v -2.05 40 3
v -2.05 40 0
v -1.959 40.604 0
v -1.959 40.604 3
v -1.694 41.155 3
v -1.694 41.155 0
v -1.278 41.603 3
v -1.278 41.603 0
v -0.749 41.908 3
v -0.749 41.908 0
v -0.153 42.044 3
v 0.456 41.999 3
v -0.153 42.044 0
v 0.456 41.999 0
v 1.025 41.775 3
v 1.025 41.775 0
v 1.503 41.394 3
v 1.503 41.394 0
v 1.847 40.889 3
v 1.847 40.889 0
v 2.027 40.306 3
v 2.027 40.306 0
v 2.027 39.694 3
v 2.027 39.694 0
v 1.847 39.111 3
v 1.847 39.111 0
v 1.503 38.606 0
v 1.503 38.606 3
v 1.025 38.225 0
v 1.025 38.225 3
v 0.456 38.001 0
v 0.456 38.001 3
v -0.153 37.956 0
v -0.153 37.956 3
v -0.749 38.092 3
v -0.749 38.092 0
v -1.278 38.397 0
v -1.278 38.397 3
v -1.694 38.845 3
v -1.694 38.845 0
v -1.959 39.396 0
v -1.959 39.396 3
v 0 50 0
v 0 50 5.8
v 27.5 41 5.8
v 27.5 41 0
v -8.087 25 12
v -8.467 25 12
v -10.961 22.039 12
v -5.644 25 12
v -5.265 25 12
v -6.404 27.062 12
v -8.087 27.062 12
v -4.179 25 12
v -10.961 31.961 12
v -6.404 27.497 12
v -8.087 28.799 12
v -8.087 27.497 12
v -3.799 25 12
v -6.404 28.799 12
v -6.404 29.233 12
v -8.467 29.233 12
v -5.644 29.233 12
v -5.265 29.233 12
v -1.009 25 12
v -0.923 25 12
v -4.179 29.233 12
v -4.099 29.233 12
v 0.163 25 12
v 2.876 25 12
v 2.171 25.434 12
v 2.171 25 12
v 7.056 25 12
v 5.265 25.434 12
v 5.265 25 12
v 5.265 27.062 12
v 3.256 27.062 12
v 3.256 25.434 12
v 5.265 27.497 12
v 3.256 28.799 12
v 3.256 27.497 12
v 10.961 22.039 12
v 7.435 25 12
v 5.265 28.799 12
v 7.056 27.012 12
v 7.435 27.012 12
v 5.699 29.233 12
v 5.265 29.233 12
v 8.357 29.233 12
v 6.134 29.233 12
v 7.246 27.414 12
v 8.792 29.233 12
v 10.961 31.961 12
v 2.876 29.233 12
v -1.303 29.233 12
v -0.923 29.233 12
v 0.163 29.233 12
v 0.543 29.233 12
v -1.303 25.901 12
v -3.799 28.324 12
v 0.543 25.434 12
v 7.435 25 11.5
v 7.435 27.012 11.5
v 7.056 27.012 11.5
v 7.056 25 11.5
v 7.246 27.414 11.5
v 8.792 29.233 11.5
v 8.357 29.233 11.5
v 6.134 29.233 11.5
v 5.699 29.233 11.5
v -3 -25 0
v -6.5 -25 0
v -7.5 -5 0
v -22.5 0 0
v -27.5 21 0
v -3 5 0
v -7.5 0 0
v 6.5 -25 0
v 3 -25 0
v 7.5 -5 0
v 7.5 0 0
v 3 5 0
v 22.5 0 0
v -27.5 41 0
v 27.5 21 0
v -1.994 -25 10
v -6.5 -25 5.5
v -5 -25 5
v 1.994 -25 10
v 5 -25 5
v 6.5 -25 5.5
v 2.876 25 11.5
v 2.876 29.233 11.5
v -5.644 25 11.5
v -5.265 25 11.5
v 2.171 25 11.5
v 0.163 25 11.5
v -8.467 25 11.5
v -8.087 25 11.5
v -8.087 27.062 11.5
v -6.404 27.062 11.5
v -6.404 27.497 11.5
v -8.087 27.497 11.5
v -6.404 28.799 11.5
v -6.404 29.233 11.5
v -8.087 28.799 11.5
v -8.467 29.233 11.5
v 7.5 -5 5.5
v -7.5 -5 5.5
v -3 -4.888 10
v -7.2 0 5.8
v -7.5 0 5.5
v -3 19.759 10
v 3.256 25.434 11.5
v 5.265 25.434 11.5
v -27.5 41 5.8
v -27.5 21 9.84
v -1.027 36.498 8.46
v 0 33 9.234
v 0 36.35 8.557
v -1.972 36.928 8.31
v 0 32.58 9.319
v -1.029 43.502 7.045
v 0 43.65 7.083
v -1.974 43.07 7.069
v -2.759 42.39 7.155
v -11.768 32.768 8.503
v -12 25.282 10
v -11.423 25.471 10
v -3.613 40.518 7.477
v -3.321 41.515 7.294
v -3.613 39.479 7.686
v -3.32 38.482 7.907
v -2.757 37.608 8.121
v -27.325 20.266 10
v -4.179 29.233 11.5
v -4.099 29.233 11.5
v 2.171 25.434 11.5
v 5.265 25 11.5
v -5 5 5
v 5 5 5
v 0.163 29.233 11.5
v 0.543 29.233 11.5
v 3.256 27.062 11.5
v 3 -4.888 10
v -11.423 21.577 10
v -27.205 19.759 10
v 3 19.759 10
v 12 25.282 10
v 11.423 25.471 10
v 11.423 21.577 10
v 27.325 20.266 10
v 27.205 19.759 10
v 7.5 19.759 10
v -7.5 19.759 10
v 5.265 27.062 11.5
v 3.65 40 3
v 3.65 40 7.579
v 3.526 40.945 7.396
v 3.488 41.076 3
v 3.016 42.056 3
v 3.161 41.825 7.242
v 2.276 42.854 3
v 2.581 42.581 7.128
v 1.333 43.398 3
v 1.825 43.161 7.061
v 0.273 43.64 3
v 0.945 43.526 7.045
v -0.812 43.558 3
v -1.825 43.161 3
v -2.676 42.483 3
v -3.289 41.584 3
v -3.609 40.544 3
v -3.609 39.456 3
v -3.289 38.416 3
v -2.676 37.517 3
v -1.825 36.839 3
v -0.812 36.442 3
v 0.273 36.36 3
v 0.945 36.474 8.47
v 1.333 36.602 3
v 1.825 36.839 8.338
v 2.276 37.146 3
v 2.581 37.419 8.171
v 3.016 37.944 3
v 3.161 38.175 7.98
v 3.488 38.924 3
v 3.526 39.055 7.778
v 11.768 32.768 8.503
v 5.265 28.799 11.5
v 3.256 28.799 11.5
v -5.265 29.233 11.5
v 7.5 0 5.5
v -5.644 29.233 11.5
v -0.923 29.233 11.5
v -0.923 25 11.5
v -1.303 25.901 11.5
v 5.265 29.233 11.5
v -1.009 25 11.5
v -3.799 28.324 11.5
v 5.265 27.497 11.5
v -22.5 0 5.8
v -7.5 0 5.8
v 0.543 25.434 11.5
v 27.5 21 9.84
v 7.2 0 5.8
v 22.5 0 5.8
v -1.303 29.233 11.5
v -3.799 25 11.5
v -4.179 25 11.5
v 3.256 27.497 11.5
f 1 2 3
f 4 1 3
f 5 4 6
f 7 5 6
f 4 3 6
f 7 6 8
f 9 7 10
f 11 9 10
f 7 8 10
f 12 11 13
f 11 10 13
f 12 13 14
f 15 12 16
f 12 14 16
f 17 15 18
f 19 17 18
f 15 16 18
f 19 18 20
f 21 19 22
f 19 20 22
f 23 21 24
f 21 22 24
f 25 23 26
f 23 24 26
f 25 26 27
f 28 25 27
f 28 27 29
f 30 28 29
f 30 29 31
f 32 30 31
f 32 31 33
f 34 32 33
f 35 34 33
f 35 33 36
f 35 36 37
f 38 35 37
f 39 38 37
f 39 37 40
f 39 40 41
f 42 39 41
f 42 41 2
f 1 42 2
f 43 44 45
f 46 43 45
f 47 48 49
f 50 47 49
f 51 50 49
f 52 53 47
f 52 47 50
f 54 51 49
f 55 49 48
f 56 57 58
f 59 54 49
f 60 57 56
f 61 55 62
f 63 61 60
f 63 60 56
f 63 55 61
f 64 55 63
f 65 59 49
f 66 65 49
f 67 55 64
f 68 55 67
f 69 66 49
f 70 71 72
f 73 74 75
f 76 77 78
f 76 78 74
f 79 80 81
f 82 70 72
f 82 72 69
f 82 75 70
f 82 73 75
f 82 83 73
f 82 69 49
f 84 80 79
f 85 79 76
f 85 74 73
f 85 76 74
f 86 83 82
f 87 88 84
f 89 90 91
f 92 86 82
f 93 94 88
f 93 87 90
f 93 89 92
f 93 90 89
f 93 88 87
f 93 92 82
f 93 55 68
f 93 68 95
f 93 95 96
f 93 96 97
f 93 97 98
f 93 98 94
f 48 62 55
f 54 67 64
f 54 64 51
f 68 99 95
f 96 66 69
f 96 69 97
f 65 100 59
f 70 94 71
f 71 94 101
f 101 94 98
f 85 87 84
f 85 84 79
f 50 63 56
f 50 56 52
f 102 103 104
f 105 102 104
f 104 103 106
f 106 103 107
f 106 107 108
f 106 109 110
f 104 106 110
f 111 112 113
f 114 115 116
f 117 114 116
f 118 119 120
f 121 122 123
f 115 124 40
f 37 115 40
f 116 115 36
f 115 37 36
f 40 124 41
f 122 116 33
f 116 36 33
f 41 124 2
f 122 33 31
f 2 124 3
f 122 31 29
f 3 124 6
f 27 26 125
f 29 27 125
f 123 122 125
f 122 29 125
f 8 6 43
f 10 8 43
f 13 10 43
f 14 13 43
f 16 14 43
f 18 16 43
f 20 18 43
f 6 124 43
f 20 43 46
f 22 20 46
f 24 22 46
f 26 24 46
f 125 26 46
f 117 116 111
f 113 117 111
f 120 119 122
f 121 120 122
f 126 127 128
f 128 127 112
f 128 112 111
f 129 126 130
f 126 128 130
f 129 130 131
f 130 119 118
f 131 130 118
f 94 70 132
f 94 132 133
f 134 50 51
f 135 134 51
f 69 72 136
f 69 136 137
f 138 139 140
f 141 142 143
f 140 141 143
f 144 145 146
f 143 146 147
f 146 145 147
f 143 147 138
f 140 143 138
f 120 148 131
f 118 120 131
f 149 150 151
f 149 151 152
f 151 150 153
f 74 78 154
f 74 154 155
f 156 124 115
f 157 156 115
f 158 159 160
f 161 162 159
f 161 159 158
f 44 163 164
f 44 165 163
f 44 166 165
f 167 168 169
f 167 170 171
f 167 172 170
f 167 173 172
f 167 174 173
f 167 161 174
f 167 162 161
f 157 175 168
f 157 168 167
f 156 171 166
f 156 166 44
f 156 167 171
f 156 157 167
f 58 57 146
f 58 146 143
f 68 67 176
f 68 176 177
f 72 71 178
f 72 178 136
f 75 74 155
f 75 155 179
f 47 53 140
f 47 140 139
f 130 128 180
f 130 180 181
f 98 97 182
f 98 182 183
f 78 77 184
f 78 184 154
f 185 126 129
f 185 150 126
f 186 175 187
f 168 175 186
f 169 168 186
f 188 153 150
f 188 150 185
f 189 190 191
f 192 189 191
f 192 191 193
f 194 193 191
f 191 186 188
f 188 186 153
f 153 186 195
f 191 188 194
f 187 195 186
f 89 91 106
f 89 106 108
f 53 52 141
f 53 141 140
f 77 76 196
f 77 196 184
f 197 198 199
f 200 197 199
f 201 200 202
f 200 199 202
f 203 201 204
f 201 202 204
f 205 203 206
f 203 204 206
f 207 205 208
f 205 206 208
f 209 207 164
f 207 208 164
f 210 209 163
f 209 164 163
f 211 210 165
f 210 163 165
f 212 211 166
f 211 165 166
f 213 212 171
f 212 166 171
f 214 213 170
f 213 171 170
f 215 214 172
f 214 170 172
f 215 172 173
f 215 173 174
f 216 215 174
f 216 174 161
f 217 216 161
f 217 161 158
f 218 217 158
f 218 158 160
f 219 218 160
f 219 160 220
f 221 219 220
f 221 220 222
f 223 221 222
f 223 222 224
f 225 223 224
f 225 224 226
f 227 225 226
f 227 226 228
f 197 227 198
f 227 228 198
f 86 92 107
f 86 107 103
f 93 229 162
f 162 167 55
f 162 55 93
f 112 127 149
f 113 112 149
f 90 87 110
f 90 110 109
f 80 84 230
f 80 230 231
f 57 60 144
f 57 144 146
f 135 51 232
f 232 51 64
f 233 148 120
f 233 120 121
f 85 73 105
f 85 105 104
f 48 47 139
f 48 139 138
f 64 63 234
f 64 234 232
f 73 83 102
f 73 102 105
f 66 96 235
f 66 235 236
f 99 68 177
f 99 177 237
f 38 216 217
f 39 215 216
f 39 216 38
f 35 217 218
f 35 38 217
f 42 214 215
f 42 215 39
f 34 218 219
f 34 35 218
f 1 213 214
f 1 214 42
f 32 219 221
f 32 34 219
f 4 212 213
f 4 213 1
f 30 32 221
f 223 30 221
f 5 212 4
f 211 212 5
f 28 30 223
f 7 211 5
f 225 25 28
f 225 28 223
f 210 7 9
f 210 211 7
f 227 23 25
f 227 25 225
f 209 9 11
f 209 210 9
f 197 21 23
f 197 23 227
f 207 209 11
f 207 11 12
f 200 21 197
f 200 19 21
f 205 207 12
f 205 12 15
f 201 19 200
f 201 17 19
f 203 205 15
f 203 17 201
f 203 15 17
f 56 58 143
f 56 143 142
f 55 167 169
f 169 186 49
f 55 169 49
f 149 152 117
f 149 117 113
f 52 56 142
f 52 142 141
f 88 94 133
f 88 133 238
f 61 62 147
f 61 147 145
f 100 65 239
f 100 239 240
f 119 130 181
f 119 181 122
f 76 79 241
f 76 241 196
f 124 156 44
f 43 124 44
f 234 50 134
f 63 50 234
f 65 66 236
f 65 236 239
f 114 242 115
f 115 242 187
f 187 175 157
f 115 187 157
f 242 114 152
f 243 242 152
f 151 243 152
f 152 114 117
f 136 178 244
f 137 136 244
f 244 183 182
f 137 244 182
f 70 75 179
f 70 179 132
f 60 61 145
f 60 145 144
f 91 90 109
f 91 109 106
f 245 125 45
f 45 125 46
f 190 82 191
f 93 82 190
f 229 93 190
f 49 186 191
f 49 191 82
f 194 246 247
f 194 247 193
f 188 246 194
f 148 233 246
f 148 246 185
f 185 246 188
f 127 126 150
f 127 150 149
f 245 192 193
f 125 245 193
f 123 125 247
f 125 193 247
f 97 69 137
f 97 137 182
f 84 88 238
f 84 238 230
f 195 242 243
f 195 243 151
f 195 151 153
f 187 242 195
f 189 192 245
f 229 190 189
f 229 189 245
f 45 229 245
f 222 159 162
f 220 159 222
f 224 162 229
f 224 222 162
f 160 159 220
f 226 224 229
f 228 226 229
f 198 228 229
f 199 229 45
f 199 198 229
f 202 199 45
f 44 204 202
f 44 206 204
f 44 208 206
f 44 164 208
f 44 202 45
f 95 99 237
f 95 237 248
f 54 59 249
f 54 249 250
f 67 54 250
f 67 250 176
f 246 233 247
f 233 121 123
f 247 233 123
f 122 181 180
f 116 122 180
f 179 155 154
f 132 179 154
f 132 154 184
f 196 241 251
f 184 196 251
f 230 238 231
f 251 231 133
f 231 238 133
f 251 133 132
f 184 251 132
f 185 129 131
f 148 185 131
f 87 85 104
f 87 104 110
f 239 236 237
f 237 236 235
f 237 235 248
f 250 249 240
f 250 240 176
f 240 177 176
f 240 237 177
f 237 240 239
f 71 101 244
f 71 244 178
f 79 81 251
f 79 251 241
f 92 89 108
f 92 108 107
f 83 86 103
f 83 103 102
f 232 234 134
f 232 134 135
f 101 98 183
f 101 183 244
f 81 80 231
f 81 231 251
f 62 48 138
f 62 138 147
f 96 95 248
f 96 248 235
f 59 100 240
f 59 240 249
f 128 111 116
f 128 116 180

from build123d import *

# Parameters (mm, degrees)
BOSS_EXTRUDE1_DEPTH  = 10
SKETCH3_OUTSIDE_W    = 75.708
SKETCH3_OUTSIDE_H    = 95.708
SHAPE_CUTS_DEPTH     = 58.933151131
DOVE_TAIL_DEPTH      = 30
SKETCH5_R            = 2.05
FASTENER_DEPTH       = 58.933151131
SKETCH7_R            = 3.65
CUT_EXTRUDE4_DEPTH   = 7
SKETCH8_W            = 24
SKETCH8_H            = 12
NAMES_PLATE_DEPTH    = 2
CHAMFER1_SIZE        = 4.2
CHAMFER1_SIZE_2      = 19.75944646
CHAMFER2_SIZE        = 4.5
CHAMFER3_SIZE        = 4.5
CHAMFER3_SIZE_2      = 1.03890686
SKETCH9_W            = 0.379914529
SKETCH9_H            = 4.233333333
AVA_NAME_PRINT_DEPTH = 0.5


with BuildPart() as part:
    # Sketch2 → Boss-Extrude1 (new body)
    with BuildSketch(Plane.XY):
        Polygon((7.5, 0), (27.5, 0), (27.5, 50), (-27.5, 50), (-27.5, 0), (-7.5, 0), (-7.5, -25), (7.5, -25), align=None)
    extrude(amount=BOSS_EXTRUDE1_DEPTH)

    # Sketch3 outside → Shape cuts (cut, through all)
    with BuildSketch(Plane.XY.offset(10)):
        with Locations((0, 12.5)):
            Rectangle(SKETCH3_OUTSIDE_W, SKETCH3_OUTSIDE_H)
        Polygon((-6.5, -25), (-7.5, -5), (-7.5, 0), (-22.5, 0), (-27.5, 21), (-27.5, 41), (0, 50), (27.5, 41), (27.5, 21), (22.5, 0), (7.5, 0), (7.5, -5), (6.5, -25), align=None, mode=Mode.SUBTRACT)
    extrude(amount=-SHAPE_CUTS_DEPTH, mode=Mode.SUBTRACT)

    # Sketch4 → Dove tail (cut)
    with BuildSketch(Plane.XZ.offset(25)):
        Polygon((-5, 5), (5, 5), (3, 0), (-3, 0), align=None)
    extrude(amount=-DOVE_TAIL_DEPTH, mode=Mode.SUBTRACT)

    # Sketch5 → Fastener (cut, through all)
    with BuildSketch(Plane(origin=(0, 0, 0), x_dir=(-1, 0, 0), z_dir=(0, 0, -1))):
        with Locations((0, 40)):
            Circle(SKETCH5_R)
    extrude(amount=-FASTENER_DEPTH, mode=Mode.SUBTRACT)

    # Sketch7 → Cut-Extrude4 (cut)
    with BuildSketch(Plane.XY.offset(10)):
        with Locations((0, 40)):
            Circle(SKETCH7_R)
    extrude(amount=-CUT_EXTRUDE4_DEPTH, mode=Mode.SUBTRACT)

    # Sketch8 → Names Plate (add)
    with BuildSketch(Plane.XY.offset(10)):
        with Locations((0, 27)):
            Rectangle(SKETCH8_W, SKETCH8_H)
    extrude(amount=NAMES_PLATE_DEPTH)

    # Chamfer1
    # the kernel refuses this chamfer: 19.75944646, 4.2 mm, written as the material it takes off along each edge
    with BuildSketch(Plane(origin=(-43.83302561, 0, 10), x_dir=(0, -0.17442650951506392, -0.9846701949274139), z_dir=(1, 0, 0))) as chamfer1_piece_1_section:
        Polygon((CHAMFER1_SIZE * 0.984670194927, CHAMFER1_SIZE * 0.174426509515), (-CHAMFER1_SIZE_2 * 0.174426509513, CHAMFER1_SIZE_2 * 0.984670194918), (0, 0), align=None)
    chamfer1_piece_1 = extrude(amount=117.66605122, mode=Mode.PRIVATE)
    chamfer1_piece_1 = split(chamfer1_piece_1, bisect_by=Plane(origin=(-7.5, 6.987243294, 8.814531777), z_dir=(-1, 0, 0)), keep=Keep.TOP, mode=Mode.PRIVATE)
    add(chamfer1_piece_1, mode=Mode.SUBTRACT)
    with BuildSketch(Plane(origin=(7.5, 0, 10), x_dir=(0, -0.17442650951506392, -0.9846701949274139), z_dir=(1, 0, 0))) as chamfer1_piece_2:
        Polygon((CHAMFER1_SIZE * 0.984670194927, CHAMFER1_SIZE * 0.174426509515), (-CHAMFER1_SIZE_2 * 0.174426509513, CHAMFER1_SIZE_2 * 0.984670194918), (0, 0), align=None)
    extrude(amount=66.33302561, mode=Mode.SUBTRACT)
    with BuildSketch(Plane(origin=(-73.83302561, 0, 10), x_dir=(0, 0.9999679748920759, 0.008003073799517023), z_dir=(1, 0, 0))) as chamfer1_piece_3:
        Polygon((CHAMFER1_SIZE_2 * 0.999967974882, -CHAMFER1_SIZE_2 * 0.00800307379944), (-CHAMFER1_SIZE * 0.00800307379952, -CHAMFER1_SIZE * 0.999967974892), (0, 0), align=None)
    extrude(amount=66.33302561, mode=Mode.SUBTRACT)
    with BuildSketch(Plane(origin=(-73.83302561, 0, 10), x_dir=(0, 0.9999679748920759, 0.008003073799517023), z_dir=(1, 0, 0))) as chamfer1_piece_4_section:
        Polygon((CHAMFER1_SIZE_2 * 0.999967974882, -CHAMFER1_SIZE_2 * 0.00800307379944), (-CHAMFER1_SIZE * 0.00800307379952, -CHAMFER1_SIZE * 0.999967974892), (0, 0), align=None)
    chamfer1_piece_4 = extrude(amount=117.66605122, mode=Mode.PRIVATE)
    chamfer1_piece_4 = split(chamfer1_piece_4, bisect_by=Plane(origin=(7.5, 6.987243294, 8.814531777), z_dir=(1, 0, 0)), keep=Keep.TOP, mode=Mode.PRIVATE)
    add(chamfer1_piece_4, mode=Mode.SUBTRACT)
    with BuildSketch(Plane(origin=(-76.286760165, 25.033423946, 10), x_dir=(0.3110290993551473, -0.9503666924740605, 0.008003073799517025), z_dir=(0.9503971290446889, 0.31103906041462565, 0))) as chamfer1_piece_5_section:
        Polygon((CHAMFER1_SIZE_2 * 0.999967974882, CHAMFER1_SIZE_2 * 0.00800307379944), (-CHAMFER1_SIZE * 0.00800307379952, CHAMFER1_SIZE * 0.999967974892), (0, 0), align=None)
    chamfer1_piece_5 = extrude(amount=131.601323812, mode=Mode.PRIVATE)
    chamfer1_piece_5 = split(chamfer1_piece_5, bisect_by=Plane(origin=(-50.474654782, 33, 8.986769107), z_dir=(0, -1, 0)), keep=Keep.TOP, mode=Mode.PRIVATE)
    chamfer1_piece_5 = split(chamfer1_piece_5, bisect_by=Plane(origin=(-12, 24.582378236, 8.986769107), z_dir=(-1, 0, 0)), keep=Keep.TOP, mode=Mode.PRIVATE)
    add(chamfer1_piece_5, mode=Mode.SUBTRACT)
    with BuildSketch(Plane(origin=(-76.286760165, 25.033423946, 10), x_dir=(0.3110290993551473, -0.9503666924740605, 0.008003073799517025), z_dir=(0.9503971290446889, 0.31103906041462565, 0))) as chamfer1_piece_6_section:
        Polygon((CHAMFER1_SIZE_2 * 0.999967974882, CHAMFER1_SIZE_2 * 0.00800307379944), (-CHAMFER1_SIZE * 0.00800307379952, CHAMFER1_SIZE * 0.999967974892), (0, 0), align=None)
    chamfer1_piece_6 = extrude(amount=131.601323812, mode=Mode.PRIVATE)
    chamfer1_piece_6 = split(chamfer1_piece_6, bisect_by=Plane(origin=(-26.699133226, 33, 8.380574439), z_dir=(0, 1, 0)), keep=Keep.TOP, mode=Mode.PRIVATE)
    chamfer1_piece_6 = split(chamfer1_piece_6, bisect_by=Plane(origin=(-12, 37.810625419, 8.380574439), z_dir=(-1, 0, 0)), keep=Keep.TOP, mode=Mode.PRIVATE)
    add(chamfer1_piece_6, mode=Mode.SUBTRACT)
    with BuildSketch(Plane(origin=(-76.286760165, 25.033423946, 10), x_dir=(0.3110290993551473, -0.9503666924740605, 0.008003073799517025), z_dir=(0.9503971290446889, 0.31103906041462565, 0))) as chamfer1_piece_7_section:
        Polygon((CHAMFER1_SIZE_2 * 0.999967974882, CHAMFER1_SIZE_2 * 0.00800307379944), (-CHAMFER1_SIZE * 0.00800307379952, CHAMFER1_SIZE * 0.999967974892), (0, 0), align=None)
    chamfer1_piece_7 = extrude(amount=131.601323812, mode=Mode.PRIVATE)
    chamfer1_piece_7 = split(chamfer1_piece_7, bisect_by=Plane(origin=(20.226611315, 33, 8.796706838), z_dir=(0, 1, 0)), keep=Keep.TOP, mode=Mode.PRIVATE)
    chamfer1_piece_7 = split(chamfer1_piece_7, bisect_by=Plane(origin=(-12, 49.436791762, 8.796706838), z_dir=(1, 0, 0)), keep=Keep.TOP, mode=Mode.PRIVATE)
    add(chamfer1_piece_7, mode=Mode.SUBTRACT)
    with BuildSketch(Plane(origin=(-48.786760165, 65.966576054, 10), x_dir=(-0.3110290993551472, -0.9503666924740605, 0.008003073799517025), z_dir=(0.9503971290446889, -0.31103906041462565, 0))) as chamfer1_piece_8_section:
        Polygon((CHAMFER1_SIZE_2 * 0.999967974882, CHAMFER1_SIZE_2 * 0.00800307379944), (-CHAMFER1_SIZE * 0.00800307379952, CHAMFER1_SIZE * 0.999967974892), (0, 0), align=None)
    chamfer1_piece_8 = extrude(amount=131.601323812, mode=Mode.PRIVATE)
    chamfer1_piece_8 = split(chamfer1_piece_8, bisect_by=Plane(origin=(12, 49.436791762, 8.796706838), z_dir=(-1, 0, 0)), keep=Keep.TOP, mode=Mode.PRIVATE)
    chamfer1_piece_8 = split(chamfer1_piece_8, bisect_by=Plane(origin=(-20.226611315, 33, 8.796706838), z_dir=(0, 1, 0)), keep=Keep.TOP, mode=Mode.PRIVATE)
    add(chamfer1_piece_8, mode=Mode.SUBTRACT)
    with BuildSketch(Plane(origin=(-48.786760165, 65.966576054, 10), x_dir=(-0.3110290993551472, -0.9503666924740605, 0.008003073799517025), z_dir=(0.9503971290446889, -0.31103906041462565, 0))) as chamfer1_piece_9_section:
        Polygon((CHAMFER1_SIZE_2 * 0.999967974882, CHAMFER1_SIZE_2 * 0.00800307379944), (-CHAMFER1_SIZE * 0.00800307379952, CHAMFER1_SIZE * 0.999967974892), (0, 0), align=None)
    chamfer1_piece_9 = extrude(amount=131.601323812, mode=Mode.PRIVATE)
    chamfer1_piece_9 = split(chamfer1_piece_9, bisect_by=Plane(origin=(12, 37.810625419, 8.380574439), z_dir=(1, 0, 0)), keep=Keep.TOP, mode=Mode.PRIVATE)
    chamfer1_piece_9 = split(chamfer1_piece_9, bisect_by=Plane(origin=(26.699133226, 33, 8.380574439), z_dir=(0, 1, 0)), keep=Keep.TOP, mode=Mode.PRIVATE)
    add(chamfer1_piece_9, mode=Mode.SUBTRACT)
    with BuildSketch(Plane(origin=(-48.786760165, 65.966576054, 10), x_dir=(-0.3110290993551472, -0.9503666924740605, 0.008003073799517025), z_dir=(0.9503971290446889, -0.31103906041462565, 0))) as chamfer1_piece_10_section:
        Polygon((CHAMFER1_SIZE_2 * 0.999967974882, CHAMFER1_SIZE_2 * 0.00800307379944), (-CHAMFER1_SIZE * 0.00800307379952, CHAMFER1_SIZE * 0.999967974892), (0, 0), align=None)
    chamfer1_piece_10 = extrude(amount=131.601323812, mode=Mode.PRIVATE)
    chamfer1_piece_10 = split(chamfer1_piece_10, bisect_by=Plane(origin=(12, 24.582378236, 8.986769107), z_dir=(1, 0, 0)), keep=Keep.TOP, mode=Mode.PRIVATE)
    chamfer1_piece_10 = split(chamfer1_piece_10, bisect_by=Plane(origin=(50.474654782, 33, 8.986769107), z_dir=(0, -1, 0)), keep=Keep.TOP, mode=Mode.PRIVATE)
    add(chamfer1_piece_10, mode=Mode.SUBTRACT)

    # Chamfer2
    # the kernel refuses this chamfer: 4.5 mm, written as the material it adds along each edge
    # the kernel refuses this chamfer: 4.5 mm, written as the material it takes off along each edge
    with BuildSketch(Plane(origin=(-7.5, 31.332019906, 10), x_dir=(0.9996219169112966, 8.91002913121734e-15, 0.02749587661058639), z_dir=(0, -1, 0))) as chamfer2_2_piece_1_section:
        Polygon((CHAMFER2_SIZE * 0.999621916911, -CHAMFER2_SIZE * 0.0274958766106), (-CHAMFER2_SIZE * 0.0274958766106, -CHAMFER2_SIZE * 0.999621916911), (0, 0), align=None)
    chamfer2_2_piece_1 = extrude(amount=47.904593352, mode=Mode.PRIVATE)
    chamfer2_2_piece_1 = split(chamfer2_2_piece_1, bisect_by=Plane(origin=(-7.425, 0, 5.65), z_dir=(0, -1, 0)), keep=Keep.TOP, mode=Mode.PRIVATE)
    add(chamfer2_2_piece_1, mode=Mode.SUBTRACT)
    with BuildSketch(Plane(origin=(-7.5, 31.332019906, 10), x_dir=(0.9996219169112966, 8.91002913121734e-15, 0.02749587661058639), z_dir=(0, -1, 0))) as chamfer2_2_piece_2_section:
        Polygon((CHAMFER2_SIZE * 0.999621916911, -CHAMFER2_SIZE * 0.0274958766106), (-CHAMFER2_SIZE * 0.0274958766106, -CHAMFER2_SIZE * 0.999621916911), (0, 0), align=None)
    chamfer2_2_piece_2 = extrude(amount=47.904593352, mode=Mode.PRIVATE)
    chamfer2_2_piece_2 = split(chamfer2_2_piece_2, bisect_by=Plane(origin=(-5.791935484, 7.646978201, 7.425415393), z_dir=(0, -0.20791169081730007, 0.9781476007339034)), keep=Keep.TOP, mode=Mode.PRIVATE)
    add(chamfer2_2_piece_2, mode=Mode.SUBTRACT)
    with BuildSketch(Plane(origin=(7.5, 31.332019906, 10), x_dir=(0.02749587661058639, 1.490299200723227e-13, -0.9996219169112966), z_dir=(0, -1, 0))) as chamfer2_2_piece_3_section:
        Polygon((CHAMFER2_SIZE * 0.999621916911, -CHAMFER2_SIZE * 0.0274958766106), (-CHAMFER2_SIZE * 0.0274958766106, -CHAMFER2_SIZE * 0.999621916911), (0, 0), align=None)
    chamfer2_2_piece_3 = extrude(amount=47.904593351, mode=Mode.PRIVATE)
    chamfer2_2_piece_3 = split(chamfer2_2_piece_3, bisect_by=Plane(origin=(5.791935484, 7.646978201, 7.425415393), z_dir=(0, -0.20791169081730007, 0.9781476007339034)), keep=Keep.TOP, mode=Mode.PRIVATE)
    add(chamfer2_2_piece_3, mode=Mode.SUBTRACT)
    with BuildSketch(Plane(origin=(7.5, 31.332019906, 10), x_dir=(0.02749587661058639, 1.490299200723227e-13, -0.9996219169112966), z_dir=(0, -1, 0))) as chamfer2_2_piece_4_section:
        Polygon((CHAMFER2_SIZE * 0.999621916911, -CHAMFER2_SIZE * 0.0274958766106), (-CHAMFER2_SIZE * 0.0274958766106, -CHAMFER2_SIZE * 0.999621916911), (0, 0), align=None)
    chamfer2_2_piece_4 = extrude(amount=47.904593351, mode=Mode.PRIVATE)
    chamfer2_2_piece_4 = split(chamfer2_2_piece_4, bisect_by=Plane(origin=(7.425, 0, 5.65), z_dir=(0, -1, 0)), keep=Keep.TOP, mode=Mode.PRIVATE)
    add(chamfer2_2_piece_4, mode=Mode.SUBTRACT)
    with BuildSketch(Plane(origin=(-5.92209326, -36.558134796, 10), x_dir=(0.9983747275087121, 0.04991873637543544, 0.02749587661058639), z_dir=(-0.049937616943892066, 0.9987523388778448, 0))) as chamfer2_2_piece_5_section:
        Polygon((CHAMFER2_SIZE * 0.999621916911, CHAMFER2_SIZE * 0.0274958766106), (-CHAMFER2_SIZE * 0.0274958766106, CHAMFER2_SIZE * 0.999621916911), (0, 0), align=None)
    chamfer2_2_piece_5 = extrude(amount=43.170131286, mode=Mode.PRIVATE)
    chamfer2_2_piece_5 = split(chamfer2_2_piece_5, bisect_by=Plane(origin=(-5.601535176, -11.523039788, 3.350702283), z_dir=(0, -0.20791169081730007, 0.9781476007339034)), keep=Keep.TOP, mode=Mode.PRIVATE)
    add(chamfer2_2_piece_5, mode=Mode.SUBTRACT)
    with BuildSketch(Plane(origin=(-5.92209326, -36.558134796, 10), x_dir=(0.9983747275087121, 0.04991873637543544, 0.02749587661058639), z_dir=(-0.049937616943892066, 0.9987523388778448, 0))) as chamfer2_2_piece_6_section:
        Polygon((CHAMFER2_SIZE * 0.999621916911, CHAMFER2_SIZE * 0.0274958766106), (-CHAMFER2_SIZE * 0.0274958766106, CHAMFER2_SIZE * 0.999621916911), (0, 0), align=None)
    chamfer2_2_piece_6 = extrude(amount=43.170131286, mode=Mode.PRIVATE)
    chamfer2_2_piece_6 = split(chamfer2_2_piece_6, bisect_by=Plane(origin=(-7.487406309, 0, 5.770981551), z_dir=(0, -1, 0)), keep=Keep.TOP, mode=Mode.PRIVATE)
    add(chamfer2_2_piece_6, mode=Mode.SUBTRACT)
    with BuildSketch(Plane(origin=(8.07790674, 6.558134796, 10), x_dir=(-0.9983747275087121, 0.04991873637543566, 0.02749587661058639), z_dir=(-0.04993761694389229, -0.9987523388778448, 0))) as chamfer2_2_piece_7_section:
        Polygon((CHAMFER2_SIZE * 0.999621916911, CHAMFER2_SIZE * 0.0274958766106), (-CHAMFER2_SIZE * 0.0274958766106, CHAMFER2_SIZE * 0.999621916911), (0, 0), align=None)
    chamfer2_2_piece_7 = extrude(amount=43.170131286, mode=Mode.PRIVATE)
    chamfer2_2_piece_7 = split(chamfer2_2_piece_7, bisect_by=Plane(origin=(6.100176862, 3.64296483, 6.574336079), z_dir=(0, -0.20791169081730007, 0.9781476007339034)), keep=Keep.TOP, mode=Mode.PRIVATE)
    add(chamfer2_2_piece_7, mode=Mode.SUBTRACT)
    with BuildSketch(Plane(origin=(8.07790674, 6.558134796, 10), x_dir=(-0.9983747275087121, 0.04991873637543566, 0.02749587661058639), z_dir=(-0.04993761694389229, -0.9987523388778448, 0))) as chamfer2_2_piece_8_section:
        Polygon((CHAMFER2_SIZE * 0.999621916911, CHAMFER2_SIZE * 0.0274958766106), (-CHAMFER2_SIZE * 0.0274958766106, CHAMFER2_SIZE * 0.999621916911), (0, 0), align=None)
    chamfer2_2_piece_8 = extrude(amount=43.170131286, mode=Mode.PRIVATE)
    chamfer2_2_piece_8 = split(chamfer2_2_piece_8, bisect_by=Plane(origin=(7.487406309, 0, 5.770981551), z_dir=(0, -1, 0)), keep=Keep.TOP, mode=Mode.PRIVATE)
    add(chamfer2_2_piece_8, mode=Mode.SUBTRACT)

    # Chamfer3
    # the kernel refuses this chamfer: 4.5, 1.03890686 mm, written as the material it takes off along each edge
    with BuildSketch(Plane(origin=(-23.688904863, 33, 12), x_dir=(0, 0.008660176093277927, -0.9999624999718906), z_dir=(1, 0, 0))) as chamfer3_piece_1_section:
        Polygon((CHAMFER3_SIZE * 0.999962499972, -CHAMFER3_SIZE * 0.00866017609328), (-CHAMFER3_SIZE_2 * 0.00866017609382, -CHAMFER3_SIZE_2 * 0.999962500034), (0, 0), align=None)
    chamfer3_piece_1 = extrude(amount=47.377809727, mode=Mode.PRIVATE)
    chamfer3_piece_1 = split(chamfer3_piece_1, bisect_by=Plane(origin=(-15.747387657, 32.981610324, 10.27905167), z_dir=(-0.06466865696139155, -0.19759867404852308, -0.9781476007336907)), keep=Keep.TOP, mode=Mode.PRIVATE)
    chamfer3_piece_1 = split(chamfer3_piece_1, bisect_by=Plane(origin=(-15.724323898, 32.577762011, 8.279932697), z_dir=(-0.06466865696139155, 0.19759867404852308, 0.9781476007336907)), keep=Keep.TOP, mode=Mode.PRIVATE)
    add(chamfer3_piece_1, mode=Mode.SUBTRACT)
    with BuildSketch(Plane(origin=(-23.688904863, 33, 12), x_dir=(0, 0.008660176093277927, -0.9999624999718906), z_dir=(1, 0, 0))) as chamfer3_piece_2_section:
        Polygon((CHAMFER3_SIZE * 0.999962499972, -CHAMFER3_SIZE * 0.00866017609328), (-CHAMFER3_SIZE_2 * 0.00866017609382, -CHAMFER3_SIZE_2 * 0.999962500034), (0, 0), align=None)
    chamfer3_piece_2 = extrude(amount=47.377809727, mode=Mode.PRIVATE)
    chamfer3_piece_2 = split(chamfer3_piece_2, bisect_by=Plane(origin=(15.724323898, 32.577762011, 8.279932697), z_dir=(0.06466865696139155, 0.19759867404852308, 0.9781476007336907)), keep=Keep.TOP, mode=Mode.PRIVATE)
    chamfer3_piece_2 = split(chamfer3_piece_2, bisect_by=Plane(origin=(15.747387657, 32.981610324, 10.27905167), z_dir=(0.06466865696139155, -0.19759867404852308, -0.9781476007336907)), keep=Keep.TOP, mode=Mode.PRIVATE)
    add(chamfer3_piece_2, mode=Mode.SUBTRACT)
    with BuildSketch(Plane(origin=(-23.688904863, 33, 12), x_dir=(0, 0.008660176093277927, -0.9999624999718906), z_dir=(1, 0, 0))) as chamfer3_piece_3_section:
        Polygon((CHAMFER3_SIZE * 0.999962499972, -CHAMFER3_SIZE * 0.00866017609328), (-CHAMFER3_SIZE_2 * 0.00866017609382, -CHAMFER3_SIZE_2 * 0.999962500034), (0, 0), align=None)
    chamfer3_piece_3 = extrude(amount=47.377809727, mode=Mode.PRIVATE)
    chamfer3_piece_3 = split(chamfer3_piece_3, bisect_by=Plane(origin=(-0.116574835, 32.257698924, 9.391885215), z_dir=(0.06466865696139155, 0.19759867404852308, 0.9781476007336907)), keep=Keep.TOP, mode=Mode.PRIVATE)
    chamfer3_piece_3 = split(chamfer3_piece_3, bisect_by=Plane(origin=(0.116574835, 32.257698924, 9.391885215), z_dir=(-0.06466865696139155, 0.19759867404852308, 0.9781476007336907)), keep=Keep.TOP, mode=Mode.PRIVATE)
    add(chamfer3_piece_3, mode=Mode.SUBTRACT)
    with BuildSketch(Plane(origin=(12, 44.688904863, 12), x_dir=(-0.9870549888826571, 0, 0.1603821963992814), z_dir=(0, -1, 0))) as chamfer3_piece_4_section:
        Polygon((CHAMFER3_SIZE_2 * 0.987054988944, CHAMFER3_SIZE_2 * 0.160382196409), (-CHAMFER3_SIZE * 0.160382196399, CHAMFER3_SIZE * 0.987054988883), (0, 0), align=None)
    chamfer3_piece_4 = extrude(amount=35.377809727, mode=Mode.PRIVATE)
    chamfer3_piece_4 = split(chamfer3_piece_4, bisect_by=Plane(origin=(11.440207801, 31.525379387, 8.775765274), z_dir=(0.06466865696139155, 0.19759867404852308, 0.9781476007336907)), keep=Keep.TOP, mode=Mode.PRIVATE)
    chamfer3_piece_4 = split(chamfer3_piece_4, bisect_by=Plane(origin=(11.602096163, 32.020038273, 10), z_dir=(0, 0, 1)), keep=Keep.TOP, mode=Mode.PRIVATE)
    add(chamfer3_piece_4, mode=Mode.SUBTRACT)
    with BuildSketch(Plane(origin=(12, 44.688904863, 12), x_dir=(-0.9870549888826571, 0, 0.1603821963992814), z_dir=(0, -1, 0))) as chamfer3_piece_5_section:
        Polygon((CHAMFER3_SIZE_2 * 0.987054988944, CHAMFER3_SIZE_2 * 0.160382196409), (-CHAMFER3_SIZE * 0.160382196399, CHAMFER3_SIZE * 0.987054988883), (0, 0), align=None)
    chamfer3_piece_5 = extrude(amount=35.377809727, mode=Mode.PRIVATE)
    chamfer3_piece_5 = split(chamfer3_piece_5, bisect_by=Plane(origin=(11.75860092, 36.766980835, 7.695842826), z_dir=(0.06466865696139155, 0.19759867404852308, 0.9781476007336907)), keep=Keep.TOP, mode=Mode.PRIVATE)
    chamfer3_piece_5 = split(chamfer3_piece_5, bisect_by=Plane(origin=(11.856026743, 37.064670851, 10), z_dir=(0, 0, -1)), keep=Keep.TOP, mode=Mode.PRIVATE)
    add(chamfer3_piece_5, mode=Mode.SUBTRACT)
    with BuildSketch(Plane(origin=(12, 44.688904863, 12), x_dir=(-0.9870549888826571, 0, 0.1603821963992814), z_dir=(0, -1, 0))) as chamfer3_piece_6_section:
        Polygon((CHAMFER3_SIZE_2 * 0.987054988944, CHAMFER3_SIZE_2 * 0.160382196409), (-CHAMFER3_SIZE * 0.160382196399, CHAMFER3_SIZE * 0.987054988883), (0, 0), align=None)
    chamfer3_piece_6 = extrude(amount=35.377809727, mode=Mode.PRIVATE)
    chamfer3_piece_6 = split(chamfer3_piece_6, bisect_by=Plane(origin=(11.705305569, 15.149533813, 12.066374843), z_dir=(-0.06466865696139155, -0.19759867404852308, -0.9781476007336907)), keep=Keep.TOP, mode=Mode.PRIVATE)
    chamfer3_piece_6 = split(chamfer3_piece_6, bisect_by=Plane(origin=(11.633502975, 14.930136998, 10), z_dir=(0, 0, 1)), keep=Keep.TOP, mode=Mode.PRIVATE)
    add(chamfer3_piece_6, mode=Mode.SUBTRACT)
    with BuildSketch(Plane(origin=(23.688904863, 21, 12), x_dir=(0, -0.008660176093277927, -0.9999624999718906), z_dir=(-1, 0, 0))) as chamfer3_piece_7_section:
        Polygon((CHAMFER3_SIZE * 0.999962499972, -CHAMFER3_SIZE * 0.00866017609328), (-CHAMFER3_SIZE_2 * 0.00866017609382, -CHAMFER3_SIZE_2 * 0.999962500034), (0, 0), align=None)
    chamfer3_piece_7 = extrude(amount=47.377809727, mode=Mode.PRIVATE)
    chamfer3_piece_7 = split(chamfer3_piece_7, bisect_by=Plane(origin=(0, 21.388678307, 10), z_dir=(0, 0, 1)), keep=Keep.TOP, mode=Mode.PRIVATE)
    add(chamfer3_piece_7, mode=Mode.SUBTRACT)
    with BuildSketch(Plane(origin=(-12, 9.311095137, 12), x_dir=(-0.008660176093277927, 0, -0.9999624999718906), z_dir=(0, 1, 0))) as chamfer3_piece_8_section:
        Polygon((CHAMFER3_SIZE * 0.999962499972, -CHAMFER3_SIZE * 0.00866017609328), (-CHAMFER3_SIZE_2 * 0.00866017609382, -CHAMFER3_SIZE_2 * 0.999962500034), (0, 0), align=None)
    chamfer3_piece_8 = extrude(amount=35.377809727, mode=Mode.PRIVATE)
    chamfer3_piece_8 = split(chamfer3_piece_8, bisect_by=Plane(origin=(-11.705305569, 15.149533813, 12.066374843), z_dir=(0.06466865696139155, -0.19759867404852308, -0.9781476007336907)), keep=Keep.TOP, mode=Mode.PRIVATE)
    chamfer3_piece_8 = split(chamfer3_piece_8, bisect_by=Plane(origin=(-11.633502975, 14.930136998, 10), z_dir=(0, 0, 1)), keep=Keep.TOP, mode=Mode.PRIVATE)
    add(chamfer3_piece_8, mode=Mode.SUBTRACT)
    with BuildSketch(Plane(origin=(-12, 9.311095137, 12), x_dir=(-0.008660176093277927, 0, -0.9999624999718906), z_dir=(0, 1, 0))) as chamfer3_piece_9_section:
        Polygon((CHAMFER3_SIZE * 0.999962499972, -CHAMFER3_SIZE * 0.00866017609328), (-CHAMFER3_SIZE_2 * 0.00866017609382, -CHAMFER3_SIZE_2 * 0.999962500034), (0, 0), align=None)
    chamfer3_piece_9 = extrude(amount=35.377809727, mode=Mode.PRIVATE)
    chamfer3_piece_9 = split(chamfer3_piece_9, bisect_by=Plane(origin=(-11.75860092, 36.766980835, 7.695842826), z_dir=(-0.06466865696139155, 0.19759867404852308, 0.9781476007336907)), keep=Keep.TOP, mode=Mode.PRIVATE)
    chamfer3_piece_9 = split(chamfer3_piece_9, bisect_by=Plane(origin=(-11.856026743, 37.064670851, 10), z_dir=(0, 0, -1)), keep=Keep.TOP, mode=Mode.PRIVATE)
    add(chamfer3_piece_9, mode=Mode.SUBTRACT)
    with BuildSketch(Plane(origin=(-12, 9.311095137, 12), x_dir=(-0.008660176093277927, 0, -0.9999624999718906), z_dir=(0, 1, 0))) as chamfer3_piece_10_section:
        Polygon((CHAMFER3_SIZE * 0.999962499972, -CHAMFER3_SIZE * 0.00866017609328), (-CHAMFER3_SIZE_2 * 0.00866017609382, -CHAMFER3_SIZE_2 * 0.999962500034), (0, 0), align=None)
    chamfer3_piece_10 = extrude(amount=35.377809727, mode=Mode.PRIVATE)
    chamfer3_piece_10 = split(chamfer3_piece_10, bisect_by=Plane(origin=(-11.440207801, 31.525379387, 8.775765274), z_dir=(-0.06466865696139155, 0.19759867404852308, 0.9781476007336907)), keep=Keep.TOP, mode=Mode.PRIVATE)
    chamfer3_piece_10 = split(chamfer3_piece_10, bisect_by=Plane(origin=(-11.602096163, 32.020038273, 10), z_dir=(0, 0, 1)), keep=Keep.TOP, mode=Mode.PRIVATE)
    add(chamfer3_piece_10, mode=Mode.SUBTRACT)

    # Sketch9 → AVA name print (cut)
    with BuildSketch(Plane.XY.offset(12)):
        Polygon((-8.466666667, 29.233333333), (-6.404273504, 29.233333333), (-6.404273504, 28.799145299), (-8.086752137, 28.799145299), (-8.086752137, 27.496581197), (-6.404273504, 27.496581197), (-6.404273504, 27.062393162), (-8.086752137, 27.062393162), (-8.086752137, 25), (-8.466666667, 25), align=None)
        with Locations((-5.45448718, 27.116666667)):
            Rectangle(SKETCH9_W, SKETCH9_H)
        Polygon((-4.179059829, 25), (-4.179059829, 29.233333333), (-4.09934562, 29.233333333), (-1.302564103, 25.901448985), (-1.302564103, 29.233333333), (-0.922649573, 29.233333333), (-0.922649573, 25), (-1.00914797, 25), (-3.799145299, 28.324252137), (-3.799145299, 25), align=None)
        Polygon((0.162820513, 29.233333333), (0.542735043, 29.233333333), (0.542735043, 25.434188034), (2.170940171, 25.434188034), (2.170940171, 25), (0.162820513, 25), align=None)
        Polygon((2.876495726, 29.233333333), (5.264529915, 29.233333333), (5.264529915, 28.799145299), (3.256410256, 28.799145299), (3.256410256, 27.496581197), (5.264529915, 27.496581197), (5.264529915, 27.062393162), (3.256410256, 27.062393162), (3.256410256, 25.434188034), (5.264529915, 25.434188034), (5.264529915, 25), (2.876495726, 25), align=None)
        Polygon((5.698717949, 29.233333333), (6.133754006, 29.233333333), (7.246360844, 27.414322917), (8.357271635, 29.233333333), (8.792307692, 29.233333333), (7.435470085, 27.012359776), (7.435470085, 25), (7.055555556, 25), (7.055555556, 27.012359776), align=None)
    extrude(amount=-AVA_NAME_PRINT_DEPTH, mode=Mode.SUBTRACT)


solid = part.part
